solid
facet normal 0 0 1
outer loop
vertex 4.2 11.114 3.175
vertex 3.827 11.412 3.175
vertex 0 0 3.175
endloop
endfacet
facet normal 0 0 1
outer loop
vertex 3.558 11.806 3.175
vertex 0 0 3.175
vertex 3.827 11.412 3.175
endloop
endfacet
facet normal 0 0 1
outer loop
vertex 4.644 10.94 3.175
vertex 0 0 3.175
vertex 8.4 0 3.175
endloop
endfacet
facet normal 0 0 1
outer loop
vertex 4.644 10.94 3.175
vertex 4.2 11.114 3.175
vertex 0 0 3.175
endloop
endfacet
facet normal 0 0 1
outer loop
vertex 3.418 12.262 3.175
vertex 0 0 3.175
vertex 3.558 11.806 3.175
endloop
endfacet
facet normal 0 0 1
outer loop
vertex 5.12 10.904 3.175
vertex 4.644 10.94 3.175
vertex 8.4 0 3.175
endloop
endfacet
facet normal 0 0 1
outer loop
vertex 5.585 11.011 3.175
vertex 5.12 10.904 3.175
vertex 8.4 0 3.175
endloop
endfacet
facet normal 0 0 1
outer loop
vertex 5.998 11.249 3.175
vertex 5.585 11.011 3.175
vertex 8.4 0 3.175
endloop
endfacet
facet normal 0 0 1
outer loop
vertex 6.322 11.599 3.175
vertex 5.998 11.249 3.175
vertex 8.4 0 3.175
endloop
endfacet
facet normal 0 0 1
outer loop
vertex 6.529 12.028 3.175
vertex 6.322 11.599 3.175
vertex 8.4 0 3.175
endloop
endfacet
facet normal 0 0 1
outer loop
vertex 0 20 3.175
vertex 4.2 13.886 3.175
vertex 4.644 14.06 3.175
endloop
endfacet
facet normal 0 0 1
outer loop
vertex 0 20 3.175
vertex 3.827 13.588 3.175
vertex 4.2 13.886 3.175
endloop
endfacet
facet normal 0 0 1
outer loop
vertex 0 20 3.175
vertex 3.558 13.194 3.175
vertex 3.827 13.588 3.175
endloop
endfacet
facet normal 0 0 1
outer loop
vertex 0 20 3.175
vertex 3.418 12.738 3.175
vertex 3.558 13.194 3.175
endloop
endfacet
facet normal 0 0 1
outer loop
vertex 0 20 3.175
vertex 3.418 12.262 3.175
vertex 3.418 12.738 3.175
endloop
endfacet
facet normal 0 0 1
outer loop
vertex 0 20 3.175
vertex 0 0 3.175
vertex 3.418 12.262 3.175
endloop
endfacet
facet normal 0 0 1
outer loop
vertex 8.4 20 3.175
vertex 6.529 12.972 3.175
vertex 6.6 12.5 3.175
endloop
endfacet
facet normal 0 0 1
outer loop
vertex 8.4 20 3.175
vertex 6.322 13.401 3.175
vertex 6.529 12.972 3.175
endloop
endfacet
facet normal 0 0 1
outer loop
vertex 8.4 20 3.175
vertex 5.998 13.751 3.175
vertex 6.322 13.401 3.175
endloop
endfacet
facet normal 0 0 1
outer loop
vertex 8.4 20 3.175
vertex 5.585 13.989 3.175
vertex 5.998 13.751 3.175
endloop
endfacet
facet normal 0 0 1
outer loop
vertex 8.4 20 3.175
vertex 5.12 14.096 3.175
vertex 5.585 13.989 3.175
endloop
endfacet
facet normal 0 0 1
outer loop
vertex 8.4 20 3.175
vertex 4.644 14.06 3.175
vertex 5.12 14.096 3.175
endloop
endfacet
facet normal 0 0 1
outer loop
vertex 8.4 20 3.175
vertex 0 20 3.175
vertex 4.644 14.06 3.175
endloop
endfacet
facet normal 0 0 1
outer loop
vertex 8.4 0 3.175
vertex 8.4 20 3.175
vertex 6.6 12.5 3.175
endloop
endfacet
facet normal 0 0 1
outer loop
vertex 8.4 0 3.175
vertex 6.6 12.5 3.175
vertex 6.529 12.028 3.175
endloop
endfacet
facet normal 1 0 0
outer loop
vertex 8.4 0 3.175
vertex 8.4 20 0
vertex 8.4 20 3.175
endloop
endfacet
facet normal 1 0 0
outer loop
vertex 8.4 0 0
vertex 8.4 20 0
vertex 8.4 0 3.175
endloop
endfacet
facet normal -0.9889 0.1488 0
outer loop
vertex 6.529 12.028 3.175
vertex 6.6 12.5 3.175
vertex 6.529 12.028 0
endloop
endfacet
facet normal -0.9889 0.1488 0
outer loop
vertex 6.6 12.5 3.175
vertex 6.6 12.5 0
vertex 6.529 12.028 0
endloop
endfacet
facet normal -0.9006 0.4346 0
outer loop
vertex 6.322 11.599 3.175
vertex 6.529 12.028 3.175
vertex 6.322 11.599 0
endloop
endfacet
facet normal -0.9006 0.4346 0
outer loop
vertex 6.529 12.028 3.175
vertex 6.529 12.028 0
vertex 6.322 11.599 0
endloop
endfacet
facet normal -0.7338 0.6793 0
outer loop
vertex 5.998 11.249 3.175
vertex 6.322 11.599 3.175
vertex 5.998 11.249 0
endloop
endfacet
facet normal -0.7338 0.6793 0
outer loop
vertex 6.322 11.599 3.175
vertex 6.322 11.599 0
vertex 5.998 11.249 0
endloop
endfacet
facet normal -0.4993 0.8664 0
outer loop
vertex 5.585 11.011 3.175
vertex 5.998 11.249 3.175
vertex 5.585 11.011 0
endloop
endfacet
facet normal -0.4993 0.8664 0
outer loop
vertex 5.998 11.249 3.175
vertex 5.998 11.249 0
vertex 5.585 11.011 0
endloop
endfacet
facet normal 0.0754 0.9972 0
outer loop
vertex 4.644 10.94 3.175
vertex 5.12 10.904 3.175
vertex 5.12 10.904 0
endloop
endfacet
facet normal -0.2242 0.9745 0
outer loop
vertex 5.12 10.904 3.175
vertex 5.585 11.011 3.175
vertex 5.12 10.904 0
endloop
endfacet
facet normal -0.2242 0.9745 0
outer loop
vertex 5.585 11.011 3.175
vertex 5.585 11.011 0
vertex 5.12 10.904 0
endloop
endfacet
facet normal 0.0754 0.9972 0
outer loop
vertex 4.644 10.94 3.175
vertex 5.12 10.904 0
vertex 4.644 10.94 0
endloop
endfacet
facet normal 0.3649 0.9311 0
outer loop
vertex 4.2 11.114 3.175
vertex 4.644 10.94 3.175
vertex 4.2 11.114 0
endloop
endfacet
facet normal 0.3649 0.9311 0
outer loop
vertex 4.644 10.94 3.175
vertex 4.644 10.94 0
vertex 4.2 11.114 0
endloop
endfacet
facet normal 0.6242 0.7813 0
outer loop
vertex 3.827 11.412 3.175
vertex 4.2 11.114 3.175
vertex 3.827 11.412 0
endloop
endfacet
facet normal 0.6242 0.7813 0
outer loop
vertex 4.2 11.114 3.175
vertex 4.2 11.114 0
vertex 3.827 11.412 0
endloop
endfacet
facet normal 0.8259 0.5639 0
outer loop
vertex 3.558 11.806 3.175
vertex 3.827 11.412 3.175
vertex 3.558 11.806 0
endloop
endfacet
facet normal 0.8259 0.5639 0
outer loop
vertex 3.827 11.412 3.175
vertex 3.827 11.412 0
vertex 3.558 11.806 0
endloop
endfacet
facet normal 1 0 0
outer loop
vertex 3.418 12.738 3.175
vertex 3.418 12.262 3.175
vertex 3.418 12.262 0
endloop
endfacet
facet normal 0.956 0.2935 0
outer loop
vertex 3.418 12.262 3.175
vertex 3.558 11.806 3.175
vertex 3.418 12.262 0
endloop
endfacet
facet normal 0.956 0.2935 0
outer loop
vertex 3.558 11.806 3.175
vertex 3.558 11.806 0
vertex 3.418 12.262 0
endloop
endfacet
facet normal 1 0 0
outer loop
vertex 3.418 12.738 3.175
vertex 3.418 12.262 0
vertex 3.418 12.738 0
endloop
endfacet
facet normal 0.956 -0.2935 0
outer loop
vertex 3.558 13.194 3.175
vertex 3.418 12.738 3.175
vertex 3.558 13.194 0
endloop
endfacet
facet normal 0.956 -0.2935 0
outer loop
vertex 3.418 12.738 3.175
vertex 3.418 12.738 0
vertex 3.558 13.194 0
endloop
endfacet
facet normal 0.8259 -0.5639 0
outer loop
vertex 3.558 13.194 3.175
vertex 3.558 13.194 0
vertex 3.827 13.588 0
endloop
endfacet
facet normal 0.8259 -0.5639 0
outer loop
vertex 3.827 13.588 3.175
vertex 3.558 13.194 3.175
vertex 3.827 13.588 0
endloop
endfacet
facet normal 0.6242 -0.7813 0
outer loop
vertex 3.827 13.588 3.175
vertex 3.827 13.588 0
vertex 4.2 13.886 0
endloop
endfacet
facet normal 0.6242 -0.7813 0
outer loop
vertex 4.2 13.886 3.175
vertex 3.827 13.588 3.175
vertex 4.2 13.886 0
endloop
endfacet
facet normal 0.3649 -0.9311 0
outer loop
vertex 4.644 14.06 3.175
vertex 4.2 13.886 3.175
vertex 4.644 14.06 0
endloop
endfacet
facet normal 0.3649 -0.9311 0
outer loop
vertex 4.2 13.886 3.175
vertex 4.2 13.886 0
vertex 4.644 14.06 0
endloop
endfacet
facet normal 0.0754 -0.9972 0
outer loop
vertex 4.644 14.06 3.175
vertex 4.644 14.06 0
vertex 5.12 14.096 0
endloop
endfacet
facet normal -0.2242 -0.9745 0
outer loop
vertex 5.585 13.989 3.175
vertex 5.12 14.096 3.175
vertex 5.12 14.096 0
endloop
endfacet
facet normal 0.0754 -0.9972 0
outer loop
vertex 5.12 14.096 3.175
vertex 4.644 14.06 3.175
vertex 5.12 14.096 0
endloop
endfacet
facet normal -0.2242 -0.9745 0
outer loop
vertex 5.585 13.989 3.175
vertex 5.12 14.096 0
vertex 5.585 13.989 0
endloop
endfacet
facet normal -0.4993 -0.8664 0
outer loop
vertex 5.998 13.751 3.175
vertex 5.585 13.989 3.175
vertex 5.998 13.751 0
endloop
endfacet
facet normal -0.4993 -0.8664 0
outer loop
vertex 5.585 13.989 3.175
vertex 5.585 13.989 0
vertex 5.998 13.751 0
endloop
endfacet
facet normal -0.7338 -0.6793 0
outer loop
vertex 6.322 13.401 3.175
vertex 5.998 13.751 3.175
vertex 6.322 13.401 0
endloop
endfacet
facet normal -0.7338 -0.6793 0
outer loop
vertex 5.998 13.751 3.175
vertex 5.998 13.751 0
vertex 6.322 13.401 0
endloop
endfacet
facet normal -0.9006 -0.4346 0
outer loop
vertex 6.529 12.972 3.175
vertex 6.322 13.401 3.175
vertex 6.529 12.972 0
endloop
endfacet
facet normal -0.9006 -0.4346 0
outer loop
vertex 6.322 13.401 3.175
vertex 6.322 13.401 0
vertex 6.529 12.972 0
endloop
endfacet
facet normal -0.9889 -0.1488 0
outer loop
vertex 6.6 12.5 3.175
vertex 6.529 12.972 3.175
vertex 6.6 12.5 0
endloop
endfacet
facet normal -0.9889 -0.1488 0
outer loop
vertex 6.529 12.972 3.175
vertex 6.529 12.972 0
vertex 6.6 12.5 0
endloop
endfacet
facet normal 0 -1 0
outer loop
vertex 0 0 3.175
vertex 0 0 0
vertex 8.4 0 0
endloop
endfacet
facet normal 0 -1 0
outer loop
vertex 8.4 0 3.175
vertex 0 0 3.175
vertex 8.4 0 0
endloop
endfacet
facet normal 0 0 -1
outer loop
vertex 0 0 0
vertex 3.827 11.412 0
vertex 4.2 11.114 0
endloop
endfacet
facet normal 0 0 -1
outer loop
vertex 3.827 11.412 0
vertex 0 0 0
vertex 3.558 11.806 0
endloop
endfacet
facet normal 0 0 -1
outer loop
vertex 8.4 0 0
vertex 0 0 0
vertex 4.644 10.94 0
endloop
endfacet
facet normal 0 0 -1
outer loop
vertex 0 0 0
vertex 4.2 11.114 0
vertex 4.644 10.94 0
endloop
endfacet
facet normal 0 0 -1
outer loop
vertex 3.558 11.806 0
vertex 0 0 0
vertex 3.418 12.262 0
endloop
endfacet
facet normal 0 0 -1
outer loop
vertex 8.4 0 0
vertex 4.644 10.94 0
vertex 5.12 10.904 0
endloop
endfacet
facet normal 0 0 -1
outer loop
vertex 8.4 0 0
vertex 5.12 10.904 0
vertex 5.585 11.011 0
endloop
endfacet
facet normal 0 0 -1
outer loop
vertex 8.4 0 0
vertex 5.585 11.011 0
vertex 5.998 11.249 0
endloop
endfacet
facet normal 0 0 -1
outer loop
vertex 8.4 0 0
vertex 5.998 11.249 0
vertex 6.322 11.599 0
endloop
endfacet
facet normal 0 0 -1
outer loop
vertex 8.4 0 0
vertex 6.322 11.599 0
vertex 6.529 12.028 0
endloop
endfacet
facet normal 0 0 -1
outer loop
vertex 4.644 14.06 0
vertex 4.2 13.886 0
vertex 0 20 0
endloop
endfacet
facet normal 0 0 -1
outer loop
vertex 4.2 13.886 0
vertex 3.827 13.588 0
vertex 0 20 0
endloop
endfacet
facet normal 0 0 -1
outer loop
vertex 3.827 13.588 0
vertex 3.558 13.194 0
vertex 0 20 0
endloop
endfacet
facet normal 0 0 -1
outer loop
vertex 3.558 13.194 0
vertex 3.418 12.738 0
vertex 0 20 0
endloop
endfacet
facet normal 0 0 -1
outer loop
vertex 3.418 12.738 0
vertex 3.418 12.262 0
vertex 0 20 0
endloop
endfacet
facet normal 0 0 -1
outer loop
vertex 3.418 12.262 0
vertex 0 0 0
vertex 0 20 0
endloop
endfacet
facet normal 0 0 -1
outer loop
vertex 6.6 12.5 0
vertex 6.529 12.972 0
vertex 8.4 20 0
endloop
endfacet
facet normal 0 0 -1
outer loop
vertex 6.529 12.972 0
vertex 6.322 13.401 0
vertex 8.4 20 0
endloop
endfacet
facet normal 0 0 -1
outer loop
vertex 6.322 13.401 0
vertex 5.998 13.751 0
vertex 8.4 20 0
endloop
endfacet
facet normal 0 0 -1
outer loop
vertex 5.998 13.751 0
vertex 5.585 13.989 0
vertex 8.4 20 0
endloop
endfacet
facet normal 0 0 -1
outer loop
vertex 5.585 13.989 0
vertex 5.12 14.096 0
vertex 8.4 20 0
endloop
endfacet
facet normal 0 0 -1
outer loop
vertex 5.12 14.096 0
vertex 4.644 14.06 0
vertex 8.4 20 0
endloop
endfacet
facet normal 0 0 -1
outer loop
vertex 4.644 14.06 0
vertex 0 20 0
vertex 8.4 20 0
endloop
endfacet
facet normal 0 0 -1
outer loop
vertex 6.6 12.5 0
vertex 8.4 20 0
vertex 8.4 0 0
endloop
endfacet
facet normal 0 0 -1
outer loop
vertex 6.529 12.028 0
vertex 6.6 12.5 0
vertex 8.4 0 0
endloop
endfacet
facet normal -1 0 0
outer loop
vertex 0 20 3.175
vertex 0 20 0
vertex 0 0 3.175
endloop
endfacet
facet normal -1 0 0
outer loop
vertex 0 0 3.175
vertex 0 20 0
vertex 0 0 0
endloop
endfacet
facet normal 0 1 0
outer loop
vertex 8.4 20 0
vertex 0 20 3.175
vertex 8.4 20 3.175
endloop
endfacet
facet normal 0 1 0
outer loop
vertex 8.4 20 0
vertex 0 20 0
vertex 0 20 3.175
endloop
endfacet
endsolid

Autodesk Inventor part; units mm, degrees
ref_plane "YZ Plane" through (0, 0, 0) normal (1, 0, 0) x (0, 1, 0)
ref_plane "XZ Plane" through (0, 0, 0) normal (0, 1, 0) x (-1, 0, 0)
ref_plane "XY Plane" through (0, 0, 0) normal (0, 0, 1) x (1, 0, 0)
sketch "Sketch1" plane through (0, 0, 0) normal (0, 0, 1) x (1, 0, 0)
  line L0 (0, 20) -> (0, 0)
  circle A0 centre (5, 12.5) radius 1.6
  line L1 (8.4, 20) -> (8.4, 0)
  line L2 (0, 20) -> (8.4, 20)
  line L3 (0, 0) -> (8.4, 0)
  dimension "d2" = 3.2
  dimension "d3" = 5
  dimension "d12" = 8.4
  dimension "d14" = 7.5
  dimension "d15" = 8.4
  dimension "d16" = 20
extrude "Extrusion1" add sketch "Sketch1" along normal blind 3.175
equation "\"d12\" = d13"
equation "\"d13\" = 8.4"
properties part number "Effector_ZProbe_B"
